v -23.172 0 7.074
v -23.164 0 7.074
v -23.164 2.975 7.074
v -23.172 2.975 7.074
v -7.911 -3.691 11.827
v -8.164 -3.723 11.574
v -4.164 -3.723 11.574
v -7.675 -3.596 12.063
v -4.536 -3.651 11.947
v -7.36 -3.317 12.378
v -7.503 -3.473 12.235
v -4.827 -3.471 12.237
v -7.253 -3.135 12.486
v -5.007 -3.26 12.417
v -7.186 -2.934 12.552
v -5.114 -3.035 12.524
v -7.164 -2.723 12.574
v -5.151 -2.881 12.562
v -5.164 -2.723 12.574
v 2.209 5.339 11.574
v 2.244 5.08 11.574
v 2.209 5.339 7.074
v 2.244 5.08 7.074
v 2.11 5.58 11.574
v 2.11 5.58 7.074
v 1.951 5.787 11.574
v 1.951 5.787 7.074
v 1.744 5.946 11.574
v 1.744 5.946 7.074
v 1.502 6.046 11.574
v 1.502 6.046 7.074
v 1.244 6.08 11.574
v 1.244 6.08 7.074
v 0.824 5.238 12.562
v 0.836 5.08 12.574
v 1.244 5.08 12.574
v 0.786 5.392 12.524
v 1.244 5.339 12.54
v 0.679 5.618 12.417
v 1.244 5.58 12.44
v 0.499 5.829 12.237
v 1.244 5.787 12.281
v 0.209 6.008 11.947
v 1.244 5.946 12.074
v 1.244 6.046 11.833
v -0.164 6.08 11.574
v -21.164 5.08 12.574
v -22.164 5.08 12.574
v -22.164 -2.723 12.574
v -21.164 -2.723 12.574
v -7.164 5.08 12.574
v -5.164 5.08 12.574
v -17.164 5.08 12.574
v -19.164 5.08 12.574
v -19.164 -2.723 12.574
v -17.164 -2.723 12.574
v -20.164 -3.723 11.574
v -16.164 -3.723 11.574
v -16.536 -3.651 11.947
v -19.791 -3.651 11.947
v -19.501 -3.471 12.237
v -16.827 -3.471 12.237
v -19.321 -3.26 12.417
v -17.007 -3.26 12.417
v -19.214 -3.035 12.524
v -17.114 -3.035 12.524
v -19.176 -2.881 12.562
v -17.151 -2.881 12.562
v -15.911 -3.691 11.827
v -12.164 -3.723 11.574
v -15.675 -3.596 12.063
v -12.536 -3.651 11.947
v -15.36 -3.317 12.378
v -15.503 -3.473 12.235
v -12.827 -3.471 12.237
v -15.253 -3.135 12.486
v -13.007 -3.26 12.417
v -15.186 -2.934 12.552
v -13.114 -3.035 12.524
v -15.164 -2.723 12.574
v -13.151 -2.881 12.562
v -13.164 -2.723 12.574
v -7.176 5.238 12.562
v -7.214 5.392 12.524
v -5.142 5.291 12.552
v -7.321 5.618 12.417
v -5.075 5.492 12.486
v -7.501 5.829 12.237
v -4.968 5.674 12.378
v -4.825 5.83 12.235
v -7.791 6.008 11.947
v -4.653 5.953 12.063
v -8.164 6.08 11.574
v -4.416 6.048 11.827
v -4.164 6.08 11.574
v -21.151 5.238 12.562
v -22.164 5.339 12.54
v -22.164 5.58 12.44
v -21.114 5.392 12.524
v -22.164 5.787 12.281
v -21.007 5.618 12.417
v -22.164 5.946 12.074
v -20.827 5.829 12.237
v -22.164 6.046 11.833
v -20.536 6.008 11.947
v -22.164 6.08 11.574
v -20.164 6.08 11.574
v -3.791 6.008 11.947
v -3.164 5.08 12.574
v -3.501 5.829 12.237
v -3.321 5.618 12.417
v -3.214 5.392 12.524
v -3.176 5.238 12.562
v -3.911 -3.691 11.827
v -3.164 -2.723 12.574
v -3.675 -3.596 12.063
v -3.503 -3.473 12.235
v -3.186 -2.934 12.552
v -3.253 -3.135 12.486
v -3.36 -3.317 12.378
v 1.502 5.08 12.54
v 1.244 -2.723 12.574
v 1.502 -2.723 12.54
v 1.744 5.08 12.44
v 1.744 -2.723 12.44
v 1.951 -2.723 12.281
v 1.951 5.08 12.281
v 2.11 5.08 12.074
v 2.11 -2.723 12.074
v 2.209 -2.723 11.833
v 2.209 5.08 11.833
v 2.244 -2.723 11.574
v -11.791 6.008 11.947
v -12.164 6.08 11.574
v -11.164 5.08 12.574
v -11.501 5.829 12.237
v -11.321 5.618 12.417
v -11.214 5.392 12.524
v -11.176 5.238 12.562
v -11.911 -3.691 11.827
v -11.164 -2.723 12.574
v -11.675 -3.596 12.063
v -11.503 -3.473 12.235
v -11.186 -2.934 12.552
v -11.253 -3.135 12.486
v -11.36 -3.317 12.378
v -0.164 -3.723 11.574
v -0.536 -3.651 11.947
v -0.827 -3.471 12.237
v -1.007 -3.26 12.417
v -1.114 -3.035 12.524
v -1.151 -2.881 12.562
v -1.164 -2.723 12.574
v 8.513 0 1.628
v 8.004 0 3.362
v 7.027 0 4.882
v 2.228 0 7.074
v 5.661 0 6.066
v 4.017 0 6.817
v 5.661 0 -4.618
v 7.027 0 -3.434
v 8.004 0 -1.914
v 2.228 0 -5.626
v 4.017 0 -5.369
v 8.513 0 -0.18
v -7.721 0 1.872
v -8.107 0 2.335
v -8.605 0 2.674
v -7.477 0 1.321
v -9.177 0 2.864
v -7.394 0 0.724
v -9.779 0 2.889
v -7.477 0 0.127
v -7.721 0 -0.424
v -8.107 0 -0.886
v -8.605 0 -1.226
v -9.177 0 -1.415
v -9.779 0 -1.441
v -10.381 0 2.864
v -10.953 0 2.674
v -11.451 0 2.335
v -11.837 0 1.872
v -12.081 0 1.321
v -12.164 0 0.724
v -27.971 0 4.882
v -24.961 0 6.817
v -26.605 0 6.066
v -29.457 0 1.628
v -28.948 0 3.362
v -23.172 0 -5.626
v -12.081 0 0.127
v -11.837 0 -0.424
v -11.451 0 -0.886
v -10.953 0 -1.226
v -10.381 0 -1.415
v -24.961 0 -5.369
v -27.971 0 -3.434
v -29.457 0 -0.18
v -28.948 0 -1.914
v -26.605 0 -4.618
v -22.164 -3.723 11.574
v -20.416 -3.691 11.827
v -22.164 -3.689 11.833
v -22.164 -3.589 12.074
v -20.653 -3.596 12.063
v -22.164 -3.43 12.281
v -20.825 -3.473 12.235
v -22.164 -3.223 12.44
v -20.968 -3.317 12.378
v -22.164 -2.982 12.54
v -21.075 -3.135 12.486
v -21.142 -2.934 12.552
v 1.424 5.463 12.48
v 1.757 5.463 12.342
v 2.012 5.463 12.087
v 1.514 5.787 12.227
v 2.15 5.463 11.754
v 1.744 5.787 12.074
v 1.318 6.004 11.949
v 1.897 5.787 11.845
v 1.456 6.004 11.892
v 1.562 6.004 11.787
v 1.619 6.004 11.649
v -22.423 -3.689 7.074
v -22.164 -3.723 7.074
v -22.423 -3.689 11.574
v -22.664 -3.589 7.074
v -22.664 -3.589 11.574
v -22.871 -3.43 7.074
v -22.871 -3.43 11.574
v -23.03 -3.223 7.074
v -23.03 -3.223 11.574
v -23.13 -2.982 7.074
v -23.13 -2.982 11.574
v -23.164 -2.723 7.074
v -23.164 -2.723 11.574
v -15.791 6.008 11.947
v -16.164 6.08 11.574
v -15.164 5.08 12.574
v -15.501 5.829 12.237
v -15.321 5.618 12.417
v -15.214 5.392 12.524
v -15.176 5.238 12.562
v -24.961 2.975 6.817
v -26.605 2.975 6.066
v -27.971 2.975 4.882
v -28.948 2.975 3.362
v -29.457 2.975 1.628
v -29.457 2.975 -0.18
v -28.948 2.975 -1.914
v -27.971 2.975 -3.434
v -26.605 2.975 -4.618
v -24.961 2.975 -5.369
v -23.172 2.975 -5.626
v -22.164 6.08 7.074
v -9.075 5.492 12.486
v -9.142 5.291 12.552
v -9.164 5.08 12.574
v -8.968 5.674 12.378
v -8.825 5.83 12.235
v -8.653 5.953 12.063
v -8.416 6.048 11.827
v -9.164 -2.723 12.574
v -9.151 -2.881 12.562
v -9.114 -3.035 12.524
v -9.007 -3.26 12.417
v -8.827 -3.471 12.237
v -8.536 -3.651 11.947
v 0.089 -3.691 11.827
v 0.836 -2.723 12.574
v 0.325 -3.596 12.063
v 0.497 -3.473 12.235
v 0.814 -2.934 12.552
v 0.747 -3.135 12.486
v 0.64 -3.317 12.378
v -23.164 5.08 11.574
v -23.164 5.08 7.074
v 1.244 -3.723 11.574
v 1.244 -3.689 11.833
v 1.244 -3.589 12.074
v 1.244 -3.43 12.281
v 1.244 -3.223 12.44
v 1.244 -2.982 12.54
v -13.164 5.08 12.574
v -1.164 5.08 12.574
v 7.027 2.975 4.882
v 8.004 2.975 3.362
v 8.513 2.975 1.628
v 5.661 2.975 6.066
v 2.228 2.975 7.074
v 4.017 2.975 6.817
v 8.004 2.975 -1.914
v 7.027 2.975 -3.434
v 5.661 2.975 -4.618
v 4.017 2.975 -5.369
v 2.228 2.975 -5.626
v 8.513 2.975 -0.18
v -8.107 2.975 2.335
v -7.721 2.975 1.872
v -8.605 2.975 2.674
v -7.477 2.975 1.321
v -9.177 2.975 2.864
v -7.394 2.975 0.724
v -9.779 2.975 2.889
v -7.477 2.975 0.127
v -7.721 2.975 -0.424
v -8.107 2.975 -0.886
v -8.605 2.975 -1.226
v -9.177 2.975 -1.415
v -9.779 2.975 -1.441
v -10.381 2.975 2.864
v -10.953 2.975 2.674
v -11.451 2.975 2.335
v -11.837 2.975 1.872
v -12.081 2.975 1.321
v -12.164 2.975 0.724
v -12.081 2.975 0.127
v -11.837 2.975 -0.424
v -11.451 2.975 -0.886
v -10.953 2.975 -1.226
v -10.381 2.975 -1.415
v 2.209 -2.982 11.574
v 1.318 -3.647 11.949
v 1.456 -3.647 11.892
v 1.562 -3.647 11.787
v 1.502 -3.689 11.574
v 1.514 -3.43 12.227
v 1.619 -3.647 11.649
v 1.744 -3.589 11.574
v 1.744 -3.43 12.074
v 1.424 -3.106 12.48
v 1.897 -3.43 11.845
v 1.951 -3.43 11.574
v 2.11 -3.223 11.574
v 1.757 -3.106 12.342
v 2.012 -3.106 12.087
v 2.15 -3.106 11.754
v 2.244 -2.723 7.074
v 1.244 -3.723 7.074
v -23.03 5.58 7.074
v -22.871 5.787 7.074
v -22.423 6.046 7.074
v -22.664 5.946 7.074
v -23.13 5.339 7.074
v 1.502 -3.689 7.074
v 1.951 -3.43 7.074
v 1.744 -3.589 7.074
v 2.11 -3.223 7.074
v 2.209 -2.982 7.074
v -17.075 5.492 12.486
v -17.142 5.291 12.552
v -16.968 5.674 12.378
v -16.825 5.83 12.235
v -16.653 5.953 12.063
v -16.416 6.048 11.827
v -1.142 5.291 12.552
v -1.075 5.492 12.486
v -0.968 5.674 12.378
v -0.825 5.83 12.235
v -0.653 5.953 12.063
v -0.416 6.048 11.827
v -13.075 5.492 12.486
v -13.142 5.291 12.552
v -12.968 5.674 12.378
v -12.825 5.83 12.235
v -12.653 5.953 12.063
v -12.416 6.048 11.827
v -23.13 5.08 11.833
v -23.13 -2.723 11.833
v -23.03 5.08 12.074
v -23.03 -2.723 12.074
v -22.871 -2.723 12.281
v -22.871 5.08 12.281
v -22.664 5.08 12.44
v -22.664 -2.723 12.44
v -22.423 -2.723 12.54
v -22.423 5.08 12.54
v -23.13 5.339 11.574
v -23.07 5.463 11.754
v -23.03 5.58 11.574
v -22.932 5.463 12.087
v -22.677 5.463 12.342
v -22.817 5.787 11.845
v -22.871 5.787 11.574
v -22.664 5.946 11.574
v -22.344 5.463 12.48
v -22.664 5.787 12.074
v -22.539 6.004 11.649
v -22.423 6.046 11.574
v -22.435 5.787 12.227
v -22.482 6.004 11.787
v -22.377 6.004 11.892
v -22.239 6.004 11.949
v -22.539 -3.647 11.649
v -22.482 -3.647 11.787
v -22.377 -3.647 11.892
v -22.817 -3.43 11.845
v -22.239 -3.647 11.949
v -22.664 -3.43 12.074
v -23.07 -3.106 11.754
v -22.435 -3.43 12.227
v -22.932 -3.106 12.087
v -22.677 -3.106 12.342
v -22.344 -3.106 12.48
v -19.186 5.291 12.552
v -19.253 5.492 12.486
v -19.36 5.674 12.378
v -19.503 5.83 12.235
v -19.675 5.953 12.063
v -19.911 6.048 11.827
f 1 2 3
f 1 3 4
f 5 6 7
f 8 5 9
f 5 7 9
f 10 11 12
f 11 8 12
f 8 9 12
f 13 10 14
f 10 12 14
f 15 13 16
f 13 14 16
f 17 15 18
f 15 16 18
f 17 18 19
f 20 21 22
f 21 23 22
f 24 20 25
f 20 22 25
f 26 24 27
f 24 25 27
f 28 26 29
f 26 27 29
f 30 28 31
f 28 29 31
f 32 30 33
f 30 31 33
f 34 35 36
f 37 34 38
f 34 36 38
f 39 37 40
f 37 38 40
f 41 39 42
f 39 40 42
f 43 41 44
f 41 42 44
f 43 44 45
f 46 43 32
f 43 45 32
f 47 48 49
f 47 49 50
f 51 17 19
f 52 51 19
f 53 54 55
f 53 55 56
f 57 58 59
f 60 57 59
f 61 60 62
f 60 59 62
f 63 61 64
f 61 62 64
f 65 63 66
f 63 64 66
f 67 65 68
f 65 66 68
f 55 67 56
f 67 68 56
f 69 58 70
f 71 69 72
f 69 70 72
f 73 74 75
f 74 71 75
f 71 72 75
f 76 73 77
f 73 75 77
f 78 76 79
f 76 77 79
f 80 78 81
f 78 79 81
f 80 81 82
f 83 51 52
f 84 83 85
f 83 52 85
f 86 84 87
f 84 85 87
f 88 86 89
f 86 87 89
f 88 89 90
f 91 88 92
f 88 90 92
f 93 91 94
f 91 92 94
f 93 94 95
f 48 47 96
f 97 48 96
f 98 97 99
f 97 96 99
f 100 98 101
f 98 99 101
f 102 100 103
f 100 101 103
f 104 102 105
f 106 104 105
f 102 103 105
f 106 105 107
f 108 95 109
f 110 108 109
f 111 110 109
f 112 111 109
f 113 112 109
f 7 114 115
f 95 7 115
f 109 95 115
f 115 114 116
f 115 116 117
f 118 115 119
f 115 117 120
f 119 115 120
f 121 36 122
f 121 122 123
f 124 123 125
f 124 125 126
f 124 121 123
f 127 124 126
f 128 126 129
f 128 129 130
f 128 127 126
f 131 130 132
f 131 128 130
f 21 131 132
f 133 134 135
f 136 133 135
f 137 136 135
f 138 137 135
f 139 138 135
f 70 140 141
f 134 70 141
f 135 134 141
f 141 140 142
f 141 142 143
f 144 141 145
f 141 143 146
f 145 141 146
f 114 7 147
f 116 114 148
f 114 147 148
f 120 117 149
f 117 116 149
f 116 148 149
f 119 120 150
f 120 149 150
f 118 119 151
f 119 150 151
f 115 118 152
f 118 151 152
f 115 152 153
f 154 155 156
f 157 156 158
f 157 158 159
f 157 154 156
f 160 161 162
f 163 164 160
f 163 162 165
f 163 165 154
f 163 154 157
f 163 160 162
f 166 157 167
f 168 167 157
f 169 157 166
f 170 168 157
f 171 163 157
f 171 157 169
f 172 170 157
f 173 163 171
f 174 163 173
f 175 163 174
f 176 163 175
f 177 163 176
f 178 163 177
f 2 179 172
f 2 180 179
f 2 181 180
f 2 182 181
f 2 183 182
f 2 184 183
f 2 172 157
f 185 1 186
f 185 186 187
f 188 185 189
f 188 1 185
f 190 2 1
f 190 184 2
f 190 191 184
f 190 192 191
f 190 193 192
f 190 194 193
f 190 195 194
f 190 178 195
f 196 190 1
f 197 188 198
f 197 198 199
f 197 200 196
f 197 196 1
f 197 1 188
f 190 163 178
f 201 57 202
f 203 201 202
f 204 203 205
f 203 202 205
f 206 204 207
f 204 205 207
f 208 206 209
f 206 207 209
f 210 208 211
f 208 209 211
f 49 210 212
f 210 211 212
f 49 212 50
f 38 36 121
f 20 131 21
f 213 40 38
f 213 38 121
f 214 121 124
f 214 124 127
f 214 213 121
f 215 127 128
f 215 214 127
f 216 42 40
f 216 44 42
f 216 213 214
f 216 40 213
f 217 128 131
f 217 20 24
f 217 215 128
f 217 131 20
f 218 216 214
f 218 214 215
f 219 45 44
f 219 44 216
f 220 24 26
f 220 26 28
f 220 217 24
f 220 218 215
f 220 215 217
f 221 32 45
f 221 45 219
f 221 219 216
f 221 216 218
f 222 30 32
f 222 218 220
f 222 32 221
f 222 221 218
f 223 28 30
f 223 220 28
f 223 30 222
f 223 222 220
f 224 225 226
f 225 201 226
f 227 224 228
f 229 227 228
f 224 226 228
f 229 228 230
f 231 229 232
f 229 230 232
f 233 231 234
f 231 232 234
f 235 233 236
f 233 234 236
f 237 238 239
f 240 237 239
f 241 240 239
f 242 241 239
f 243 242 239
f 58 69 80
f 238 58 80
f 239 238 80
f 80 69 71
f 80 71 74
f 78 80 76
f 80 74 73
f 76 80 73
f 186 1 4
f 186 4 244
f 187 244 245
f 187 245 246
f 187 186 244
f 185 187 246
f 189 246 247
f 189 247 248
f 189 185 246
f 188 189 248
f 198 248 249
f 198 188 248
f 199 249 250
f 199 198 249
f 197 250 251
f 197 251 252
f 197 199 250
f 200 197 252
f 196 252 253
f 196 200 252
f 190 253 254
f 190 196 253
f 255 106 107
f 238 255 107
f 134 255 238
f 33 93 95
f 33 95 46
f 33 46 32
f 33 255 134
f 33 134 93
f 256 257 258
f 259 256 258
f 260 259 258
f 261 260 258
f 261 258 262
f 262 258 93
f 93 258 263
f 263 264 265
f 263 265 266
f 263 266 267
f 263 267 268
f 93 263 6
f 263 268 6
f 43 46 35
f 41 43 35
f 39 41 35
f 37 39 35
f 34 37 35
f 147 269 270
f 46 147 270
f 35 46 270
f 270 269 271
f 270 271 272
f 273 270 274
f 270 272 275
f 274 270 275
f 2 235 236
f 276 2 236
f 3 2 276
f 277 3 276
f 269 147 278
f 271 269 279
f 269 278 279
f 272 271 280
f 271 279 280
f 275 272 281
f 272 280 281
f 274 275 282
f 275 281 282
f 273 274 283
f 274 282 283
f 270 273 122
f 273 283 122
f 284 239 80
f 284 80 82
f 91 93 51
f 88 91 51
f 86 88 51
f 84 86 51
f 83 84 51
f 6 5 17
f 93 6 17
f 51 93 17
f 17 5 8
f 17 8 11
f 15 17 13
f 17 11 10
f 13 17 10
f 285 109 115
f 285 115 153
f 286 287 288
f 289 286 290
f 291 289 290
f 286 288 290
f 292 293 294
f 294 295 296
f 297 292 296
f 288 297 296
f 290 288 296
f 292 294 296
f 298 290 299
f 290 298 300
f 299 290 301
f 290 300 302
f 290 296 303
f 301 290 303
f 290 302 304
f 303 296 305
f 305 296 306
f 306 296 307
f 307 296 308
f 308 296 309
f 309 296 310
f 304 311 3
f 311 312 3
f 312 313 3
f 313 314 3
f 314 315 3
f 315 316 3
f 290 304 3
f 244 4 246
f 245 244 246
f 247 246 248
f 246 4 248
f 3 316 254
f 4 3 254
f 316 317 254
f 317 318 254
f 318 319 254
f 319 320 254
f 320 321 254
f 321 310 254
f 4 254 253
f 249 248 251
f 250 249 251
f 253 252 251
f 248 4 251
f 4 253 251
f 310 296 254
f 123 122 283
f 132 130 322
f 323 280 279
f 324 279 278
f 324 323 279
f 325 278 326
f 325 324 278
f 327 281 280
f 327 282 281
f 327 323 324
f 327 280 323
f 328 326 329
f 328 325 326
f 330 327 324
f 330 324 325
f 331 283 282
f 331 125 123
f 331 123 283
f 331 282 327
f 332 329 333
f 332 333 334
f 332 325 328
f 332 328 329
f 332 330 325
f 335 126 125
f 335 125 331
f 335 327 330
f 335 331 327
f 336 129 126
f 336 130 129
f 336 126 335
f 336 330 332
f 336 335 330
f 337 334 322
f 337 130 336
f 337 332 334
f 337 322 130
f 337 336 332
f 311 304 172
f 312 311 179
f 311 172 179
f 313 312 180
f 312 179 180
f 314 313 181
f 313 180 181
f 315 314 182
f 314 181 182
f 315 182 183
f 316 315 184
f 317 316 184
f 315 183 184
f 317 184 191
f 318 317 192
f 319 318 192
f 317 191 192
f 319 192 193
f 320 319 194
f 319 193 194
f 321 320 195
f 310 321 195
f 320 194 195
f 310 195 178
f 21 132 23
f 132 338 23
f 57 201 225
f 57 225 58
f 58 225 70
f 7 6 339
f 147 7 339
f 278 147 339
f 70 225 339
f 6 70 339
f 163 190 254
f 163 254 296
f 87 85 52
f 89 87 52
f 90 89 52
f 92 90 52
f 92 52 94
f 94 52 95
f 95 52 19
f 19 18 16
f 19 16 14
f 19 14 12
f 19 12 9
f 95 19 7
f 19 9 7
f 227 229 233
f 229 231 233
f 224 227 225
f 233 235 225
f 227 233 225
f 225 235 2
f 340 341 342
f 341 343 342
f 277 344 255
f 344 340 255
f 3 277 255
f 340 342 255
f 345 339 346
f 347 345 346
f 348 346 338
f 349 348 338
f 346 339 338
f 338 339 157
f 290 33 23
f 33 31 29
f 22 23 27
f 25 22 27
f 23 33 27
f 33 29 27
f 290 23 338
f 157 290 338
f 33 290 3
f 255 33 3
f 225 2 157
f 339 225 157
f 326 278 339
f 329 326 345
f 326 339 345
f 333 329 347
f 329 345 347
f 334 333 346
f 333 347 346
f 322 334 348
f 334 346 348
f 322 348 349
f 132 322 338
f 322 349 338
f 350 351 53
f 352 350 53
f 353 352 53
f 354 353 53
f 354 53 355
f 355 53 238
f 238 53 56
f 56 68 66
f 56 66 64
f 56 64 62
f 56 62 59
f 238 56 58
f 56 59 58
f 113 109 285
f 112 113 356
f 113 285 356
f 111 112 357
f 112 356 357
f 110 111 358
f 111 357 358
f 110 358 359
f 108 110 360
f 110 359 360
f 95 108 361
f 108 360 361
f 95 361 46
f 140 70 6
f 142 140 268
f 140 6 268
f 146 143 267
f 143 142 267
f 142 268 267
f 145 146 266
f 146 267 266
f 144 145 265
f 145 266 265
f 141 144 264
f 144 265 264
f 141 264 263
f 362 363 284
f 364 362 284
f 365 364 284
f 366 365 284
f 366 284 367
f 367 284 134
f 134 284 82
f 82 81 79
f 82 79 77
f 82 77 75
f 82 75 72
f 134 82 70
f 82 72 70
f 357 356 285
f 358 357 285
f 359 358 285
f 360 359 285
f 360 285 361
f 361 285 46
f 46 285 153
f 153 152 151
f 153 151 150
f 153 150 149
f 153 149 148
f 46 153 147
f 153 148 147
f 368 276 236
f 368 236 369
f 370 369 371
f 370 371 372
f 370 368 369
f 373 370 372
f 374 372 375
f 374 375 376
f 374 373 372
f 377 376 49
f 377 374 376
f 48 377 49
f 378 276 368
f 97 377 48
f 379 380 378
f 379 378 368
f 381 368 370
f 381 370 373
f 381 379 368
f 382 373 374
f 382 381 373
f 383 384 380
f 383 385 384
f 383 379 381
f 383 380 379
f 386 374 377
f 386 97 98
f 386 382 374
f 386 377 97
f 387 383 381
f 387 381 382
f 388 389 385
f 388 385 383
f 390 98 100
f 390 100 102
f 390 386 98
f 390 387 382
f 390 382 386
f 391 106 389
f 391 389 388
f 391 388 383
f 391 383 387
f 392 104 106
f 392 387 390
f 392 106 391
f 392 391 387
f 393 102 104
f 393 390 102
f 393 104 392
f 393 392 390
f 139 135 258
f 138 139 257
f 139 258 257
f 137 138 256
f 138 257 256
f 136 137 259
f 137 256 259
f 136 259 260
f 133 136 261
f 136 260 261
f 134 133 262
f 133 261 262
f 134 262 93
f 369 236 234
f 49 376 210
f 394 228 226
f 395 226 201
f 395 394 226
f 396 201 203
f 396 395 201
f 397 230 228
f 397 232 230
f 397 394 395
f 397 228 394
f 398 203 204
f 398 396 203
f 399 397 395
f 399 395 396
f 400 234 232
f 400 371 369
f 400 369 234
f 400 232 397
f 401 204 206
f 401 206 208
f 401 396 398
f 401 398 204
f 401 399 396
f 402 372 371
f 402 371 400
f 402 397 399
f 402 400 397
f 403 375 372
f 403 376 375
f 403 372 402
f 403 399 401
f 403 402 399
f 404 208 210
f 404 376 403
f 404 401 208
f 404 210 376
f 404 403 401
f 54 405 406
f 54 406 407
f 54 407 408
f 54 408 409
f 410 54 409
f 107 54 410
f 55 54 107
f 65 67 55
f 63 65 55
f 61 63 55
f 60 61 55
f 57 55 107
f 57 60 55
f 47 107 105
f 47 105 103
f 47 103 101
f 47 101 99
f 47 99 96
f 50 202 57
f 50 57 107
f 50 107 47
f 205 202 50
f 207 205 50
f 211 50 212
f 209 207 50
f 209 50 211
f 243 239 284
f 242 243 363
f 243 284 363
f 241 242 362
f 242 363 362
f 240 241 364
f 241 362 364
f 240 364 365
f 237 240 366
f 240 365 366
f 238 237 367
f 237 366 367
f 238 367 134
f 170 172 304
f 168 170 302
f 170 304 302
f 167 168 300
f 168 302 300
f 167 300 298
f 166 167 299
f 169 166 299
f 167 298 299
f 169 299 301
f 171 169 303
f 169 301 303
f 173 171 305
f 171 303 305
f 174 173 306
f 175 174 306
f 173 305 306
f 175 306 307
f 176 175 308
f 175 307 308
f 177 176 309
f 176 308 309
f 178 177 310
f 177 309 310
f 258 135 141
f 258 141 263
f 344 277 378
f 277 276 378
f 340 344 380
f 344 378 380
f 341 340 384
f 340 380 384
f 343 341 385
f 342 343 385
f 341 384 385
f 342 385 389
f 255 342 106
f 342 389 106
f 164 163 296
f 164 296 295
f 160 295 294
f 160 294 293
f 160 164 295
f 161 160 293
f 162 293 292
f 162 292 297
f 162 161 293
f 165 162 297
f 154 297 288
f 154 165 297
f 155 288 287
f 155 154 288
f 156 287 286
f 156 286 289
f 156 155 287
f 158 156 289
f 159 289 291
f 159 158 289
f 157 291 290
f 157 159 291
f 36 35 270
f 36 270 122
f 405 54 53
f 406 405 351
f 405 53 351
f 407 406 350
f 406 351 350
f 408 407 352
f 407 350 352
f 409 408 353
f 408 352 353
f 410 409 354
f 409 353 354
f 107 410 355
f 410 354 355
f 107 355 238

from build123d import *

# Parameters (mm, degrees)
BOSS_EXTRUDE1_DEPTH = 2.975
SKETCH2_W           = 25.407464895
SKETCH2_H           = 9.803414335
BOSS_EXTRUDE2_DEPTH = 5.5
FILLET1_R           = 1
FILLET2_R           = 1
FILLET3_R           = 1
FILLET4_R           = 1
CUT_EXTRUDE3_DEPTH  = 10
SKETCH6_R           = 2.175
CUT_EXTRUDE4_DEPTH  = 10
SKETCH5_R           = 2.175
CUT_EXTRUDE2_DEPTH  = 10


with BuildPart() as part:
    # Sketch1 → Boss-Extrude1 (new body)
    with BuildSketch(Plane(origin=(0, 0, 0), x_dir=(1, 0, 0), z_dir=(0, 1, 0))):
        with BuildLine():
            Line((-23.171929825, 5.625877193), (2.228070175, 5.625877193))
            ThreePointArc((2.228070175, 5.625877193), (8.578070175, -0.724122807), (2.228070175, -7.074122807))
            Line((2.228070175, -7.074122807), (-23.171929825, -7.074122807))
            ThreePointArc((-23.171929825, -7.074122807), (-29.521929825, -0.724122807), (-23.171929825, 5.625877193))
        make_face()
    extrude(amount=BOSS_EXTRUDE1_DEPTH)

    # Sketch2 → Boss-Extrude2 (add)
    with BuildSketch(Plane.XY.offset(7.074122807)):
        with Locations((-10.460194126, 1.178603883)):
            Rectangle(SKETCH2_W, SKETCH2_H)
    extrude(amount=BOSS_EXTRUDE2_DEPTH)

    # Fillet1
    fillet1_edges = [part.edges().sort_by_distance(p)[0] for p in [
        (-23.163926573, 1.178603883, 12.574122807),
    ]]
    fillet(fillet1_edges, radius=FILLET1_R)

    # Fillet2
    fillet2_edges = [part.edges().sort_by_distance(p)[0] for p in [
        (2.243538322, 1.178603883, 12.574122807),
    ]]
    fillet(fillet2_edges, radius=FILLET2_R)

    # Fillet3
    fillet3_edges = [part.edges().sort_by_distance(p)[0] for p in [
        (-10.460194125, -3.723103285, 12.574122807),
        (-23.163926573, -3.723103285, 9.324122807),
        (-22.871033354, -3.723103285, 12.281229588),
        (2.243538322, -3.723103285, 9.324122807),
        (1.950645103, -3.723103285, 12.281229588),
    ]]
    fillet(fillet3_edges, radius=FILLET3_R)

    # Fillet4
    fillet4_edges = [part.edges().sort_by_distance(p)[0] for p in [
        (-23.163926573, 6.08031105, 9.324122807),
        (-22.871033354, 6.08031105, 12.281229588),
        (-10.460194125, 6.08031105, 12.574122807),
        (2.243538322, 6.08031105, 9.324122807),
        (1.950645103, 6.08031105, 12.281229588),
    ]]
    fillet(fillet4_edges, radius=FILLET4_R)

    # Sketch4 → Cut-Extrude3 (cut)
    with BuildSketch(Plane.XZ.offset(3.723103285)):
        Polygon((-15.163926573, 12.574122807), (-17.163926573, 12.574122807), (-16.163926519, 11.574122807), align=None)
        Polygon((-11.163926573, 12.574122807), (-13.163926573, 12.574122807), (-12.163926519, 11.574122807), align=None)
        Polygon((-7.163926573, 12.574122807), (-9.163926573, 12.574122807), (-8.163926519, 11.574122807), align=None)
        Polygon((-3.163926573, 12.574122807), (-5.163926573, 12.574122807), (-4.163926519, 11.574122807), align=None)
        Polygon((0.836073427, 12.574122807), (-1.163926573, 12.574122807), (-0.163926519, 11.574122807), align=None)
        Polygon((-21.163926573, 12.574122807), (-19.163926573, 12.574122807), (-20.163926519, 11.574122807), align=None)
    extrude(amount=-CUT_EXTRUDE3_DEPTH, mode=Mode.SUBTRACT)

    # Sketch6 → Cut-Extrude4 (cut)
    with BuildSketch(Plane(origin=(0, 2.975, 0), x_dir=(1, 0, 0), z_dir=(0, 1, 0))):
        with Locations(Location((-9.568561245, -0.724122807, 0), (0, 0, 270))):
            Circle(SKETCH6_R)
    extrude(amount=-CUT_EXTRUDE4_DEPTH, mode=Mode.SUBTRACT)

    # Sketch5 → Cut-Extrude2 (cut)
    with BuildSketch(Plane.XZ):
        with Locations((-9.989014044, 0.724122807)):
            Circle(SKETCH5_R)
    extrude(amount=-CUT_EXTRUDE2_DEPTH, mode=Mode.SUBTRACT)


solid = part.part
